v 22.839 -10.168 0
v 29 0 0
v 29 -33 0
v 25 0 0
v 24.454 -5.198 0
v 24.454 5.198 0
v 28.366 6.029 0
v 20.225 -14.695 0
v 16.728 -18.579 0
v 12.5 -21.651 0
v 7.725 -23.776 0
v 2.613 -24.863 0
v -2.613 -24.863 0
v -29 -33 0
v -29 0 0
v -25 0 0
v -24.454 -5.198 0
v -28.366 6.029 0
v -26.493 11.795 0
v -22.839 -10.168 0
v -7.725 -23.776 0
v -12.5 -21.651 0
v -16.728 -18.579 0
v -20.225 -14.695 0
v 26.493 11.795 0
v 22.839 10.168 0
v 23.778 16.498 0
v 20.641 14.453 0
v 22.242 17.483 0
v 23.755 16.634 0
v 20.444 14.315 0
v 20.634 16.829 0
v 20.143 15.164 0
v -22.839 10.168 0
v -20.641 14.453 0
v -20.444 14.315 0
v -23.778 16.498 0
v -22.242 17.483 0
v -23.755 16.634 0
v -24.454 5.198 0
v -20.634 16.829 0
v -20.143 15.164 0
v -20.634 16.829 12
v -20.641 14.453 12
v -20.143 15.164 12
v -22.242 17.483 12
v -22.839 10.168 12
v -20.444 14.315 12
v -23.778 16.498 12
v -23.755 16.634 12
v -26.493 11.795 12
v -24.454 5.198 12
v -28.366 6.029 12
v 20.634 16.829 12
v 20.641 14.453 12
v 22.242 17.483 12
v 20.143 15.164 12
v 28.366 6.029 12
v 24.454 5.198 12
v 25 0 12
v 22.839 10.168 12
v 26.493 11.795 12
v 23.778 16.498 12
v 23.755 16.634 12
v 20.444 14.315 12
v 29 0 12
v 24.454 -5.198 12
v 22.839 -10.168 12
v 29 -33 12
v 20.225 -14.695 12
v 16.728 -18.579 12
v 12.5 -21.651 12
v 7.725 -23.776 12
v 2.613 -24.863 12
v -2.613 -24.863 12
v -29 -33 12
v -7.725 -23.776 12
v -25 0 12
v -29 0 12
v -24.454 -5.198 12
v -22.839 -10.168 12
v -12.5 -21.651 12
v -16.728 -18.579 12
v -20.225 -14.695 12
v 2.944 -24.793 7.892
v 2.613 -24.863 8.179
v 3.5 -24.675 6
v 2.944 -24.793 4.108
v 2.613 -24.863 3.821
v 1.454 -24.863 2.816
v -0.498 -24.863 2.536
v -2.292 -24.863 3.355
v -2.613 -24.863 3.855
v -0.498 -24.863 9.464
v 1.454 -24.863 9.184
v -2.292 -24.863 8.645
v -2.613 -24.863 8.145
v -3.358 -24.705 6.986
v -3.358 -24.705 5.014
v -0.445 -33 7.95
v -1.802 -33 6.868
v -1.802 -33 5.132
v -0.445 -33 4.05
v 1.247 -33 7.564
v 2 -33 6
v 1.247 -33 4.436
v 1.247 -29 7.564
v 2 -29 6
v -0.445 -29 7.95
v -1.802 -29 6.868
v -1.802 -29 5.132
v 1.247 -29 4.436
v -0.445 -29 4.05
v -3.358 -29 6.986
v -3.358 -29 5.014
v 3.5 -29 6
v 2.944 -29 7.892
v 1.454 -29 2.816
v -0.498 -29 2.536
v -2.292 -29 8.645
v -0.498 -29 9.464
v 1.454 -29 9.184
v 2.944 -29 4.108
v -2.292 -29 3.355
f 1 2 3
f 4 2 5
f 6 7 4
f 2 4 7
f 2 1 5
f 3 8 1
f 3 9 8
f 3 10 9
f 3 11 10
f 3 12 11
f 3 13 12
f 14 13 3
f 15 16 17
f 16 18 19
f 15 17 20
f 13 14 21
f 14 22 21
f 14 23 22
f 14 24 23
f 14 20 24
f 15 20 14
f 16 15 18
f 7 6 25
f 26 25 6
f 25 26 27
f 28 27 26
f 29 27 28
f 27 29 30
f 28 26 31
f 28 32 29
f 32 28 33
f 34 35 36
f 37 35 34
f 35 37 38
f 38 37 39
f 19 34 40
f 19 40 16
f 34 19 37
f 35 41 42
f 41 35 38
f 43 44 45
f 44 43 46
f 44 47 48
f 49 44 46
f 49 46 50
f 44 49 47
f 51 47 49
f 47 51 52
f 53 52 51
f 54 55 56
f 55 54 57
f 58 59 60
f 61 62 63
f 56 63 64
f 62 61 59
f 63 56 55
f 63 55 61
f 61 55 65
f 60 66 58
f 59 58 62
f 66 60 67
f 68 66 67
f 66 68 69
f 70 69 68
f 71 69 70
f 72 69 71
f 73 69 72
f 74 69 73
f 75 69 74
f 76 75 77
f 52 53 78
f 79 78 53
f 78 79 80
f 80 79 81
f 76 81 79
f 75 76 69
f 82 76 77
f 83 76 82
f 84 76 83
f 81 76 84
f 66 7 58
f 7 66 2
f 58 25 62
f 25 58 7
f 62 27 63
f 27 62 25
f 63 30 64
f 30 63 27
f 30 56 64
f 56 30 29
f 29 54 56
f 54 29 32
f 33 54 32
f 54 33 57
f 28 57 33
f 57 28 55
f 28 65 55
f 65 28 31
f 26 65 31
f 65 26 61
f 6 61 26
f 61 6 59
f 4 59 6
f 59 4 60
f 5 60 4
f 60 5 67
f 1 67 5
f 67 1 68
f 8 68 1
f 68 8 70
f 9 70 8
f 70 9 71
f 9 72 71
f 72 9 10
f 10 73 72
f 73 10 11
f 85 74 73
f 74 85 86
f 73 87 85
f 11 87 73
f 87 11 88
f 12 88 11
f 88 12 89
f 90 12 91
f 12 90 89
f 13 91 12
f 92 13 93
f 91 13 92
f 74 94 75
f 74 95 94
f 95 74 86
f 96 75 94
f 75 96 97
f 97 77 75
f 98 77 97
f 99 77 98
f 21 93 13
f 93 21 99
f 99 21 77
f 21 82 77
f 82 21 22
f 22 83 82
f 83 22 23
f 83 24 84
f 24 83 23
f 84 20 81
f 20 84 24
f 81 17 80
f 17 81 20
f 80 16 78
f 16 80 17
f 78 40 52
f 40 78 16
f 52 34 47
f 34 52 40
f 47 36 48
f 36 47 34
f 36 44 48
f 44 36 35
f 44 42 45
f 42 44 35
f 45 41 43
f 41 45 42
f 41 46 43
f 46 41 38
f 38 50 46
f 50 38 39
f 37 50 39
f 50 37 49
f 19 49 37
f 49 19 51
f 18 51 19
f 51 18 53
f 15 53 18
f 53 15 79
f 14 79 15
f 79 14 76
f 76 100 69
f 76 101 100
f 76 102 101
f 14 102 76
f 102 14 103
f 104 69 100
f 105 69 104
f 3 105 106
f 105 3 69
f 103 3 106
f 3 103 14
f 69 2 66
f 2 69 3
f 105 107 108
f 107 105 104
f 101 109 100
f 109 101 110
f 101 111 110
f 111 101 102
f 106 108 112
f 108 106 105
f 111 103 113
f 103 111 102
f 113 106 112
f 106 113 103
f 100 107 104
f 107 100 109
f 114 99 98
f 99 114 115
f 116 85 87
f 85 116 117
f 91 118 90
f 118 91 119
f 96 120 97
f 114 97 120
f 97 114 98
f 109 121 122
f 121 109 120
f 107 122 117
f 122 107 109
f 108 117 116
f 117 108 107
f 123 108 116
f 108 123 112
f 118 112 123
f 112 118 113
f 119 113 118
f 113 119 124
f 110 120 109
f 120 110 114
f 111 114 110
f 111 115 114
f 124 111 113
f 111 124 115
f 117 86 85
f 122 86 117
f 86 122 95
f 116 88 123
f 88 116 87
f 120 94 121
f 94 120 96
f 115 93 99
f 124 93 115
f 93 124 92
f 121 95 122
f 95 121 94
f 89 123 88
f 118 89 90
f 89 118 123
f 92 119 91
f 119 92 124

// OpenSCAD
// [FL_INDEX: keywords="openscad, 3d_parametric, Click___Clamp, csg_solid" | COT="Parametric OpenSCAD design from 3DCodeverse"]
// Title: Click & Clamp

// click & clamp

pipe_diameter=50;
pipe_radius=pipe_diameter/2;

clamp_thickness=4;

clamp_radius=pipe_radius+clamp_thickness;

screw_diameter=4;
screw_radius=screw_diameter/2;

screw_head_diameter=7;
screw_head_radius=screw_head_diameter/2;


clamp_height=12;
opening_angle=110;

difference(){
	linear_extrude(height=clamp_height){
		difference(){
			union(){
				translate([-clamp_radius,-clamp_radius-clamp_thickness,0])
					square([2*clamp_radius,clamp_radius+clamp_thickness]);
				circle(r=clamp_radius);
			}
			circle(r=pipe_radius);
			polygon(points=[	[0,0],
								[clamp_radius*cos((180-opening_angle)/2),clamp_radius*sin((180-opening_angle)/2)],
								[clamp_radius*cos((180-opening_angle)/2),clamp_radius],
								[clamp_radius*cos(90+opening_angle/2),clamp_radius],
								[clamp_radius*cos(90+opening_angle/2),clamp_radius*sin(90+opening_angle/2)]],
					path=[0,1,2,3,4]);
		}
		rotate([0,0,(180-opening_angle)/2]) translate([pipe_radius+1/2*clamp_thickness,0,0]) circle(r=clamp_thickness/2);
		rotate([0,0,90+opening_angle/2]) translate([pipe_radius+1/2*clamp_thickness,0,0]) circle(r=clamp_thickness/2);
	}
translate([0,0,clamp_height/2]) rotate([90,0,0]) cylinder(r=screw_radius,h=clamp_radius*2);
translate([0,0,clamp_height/2]) rotate([90,0,0]) cylinder(r=screw_head_radius,h=clamp_radius);
}
